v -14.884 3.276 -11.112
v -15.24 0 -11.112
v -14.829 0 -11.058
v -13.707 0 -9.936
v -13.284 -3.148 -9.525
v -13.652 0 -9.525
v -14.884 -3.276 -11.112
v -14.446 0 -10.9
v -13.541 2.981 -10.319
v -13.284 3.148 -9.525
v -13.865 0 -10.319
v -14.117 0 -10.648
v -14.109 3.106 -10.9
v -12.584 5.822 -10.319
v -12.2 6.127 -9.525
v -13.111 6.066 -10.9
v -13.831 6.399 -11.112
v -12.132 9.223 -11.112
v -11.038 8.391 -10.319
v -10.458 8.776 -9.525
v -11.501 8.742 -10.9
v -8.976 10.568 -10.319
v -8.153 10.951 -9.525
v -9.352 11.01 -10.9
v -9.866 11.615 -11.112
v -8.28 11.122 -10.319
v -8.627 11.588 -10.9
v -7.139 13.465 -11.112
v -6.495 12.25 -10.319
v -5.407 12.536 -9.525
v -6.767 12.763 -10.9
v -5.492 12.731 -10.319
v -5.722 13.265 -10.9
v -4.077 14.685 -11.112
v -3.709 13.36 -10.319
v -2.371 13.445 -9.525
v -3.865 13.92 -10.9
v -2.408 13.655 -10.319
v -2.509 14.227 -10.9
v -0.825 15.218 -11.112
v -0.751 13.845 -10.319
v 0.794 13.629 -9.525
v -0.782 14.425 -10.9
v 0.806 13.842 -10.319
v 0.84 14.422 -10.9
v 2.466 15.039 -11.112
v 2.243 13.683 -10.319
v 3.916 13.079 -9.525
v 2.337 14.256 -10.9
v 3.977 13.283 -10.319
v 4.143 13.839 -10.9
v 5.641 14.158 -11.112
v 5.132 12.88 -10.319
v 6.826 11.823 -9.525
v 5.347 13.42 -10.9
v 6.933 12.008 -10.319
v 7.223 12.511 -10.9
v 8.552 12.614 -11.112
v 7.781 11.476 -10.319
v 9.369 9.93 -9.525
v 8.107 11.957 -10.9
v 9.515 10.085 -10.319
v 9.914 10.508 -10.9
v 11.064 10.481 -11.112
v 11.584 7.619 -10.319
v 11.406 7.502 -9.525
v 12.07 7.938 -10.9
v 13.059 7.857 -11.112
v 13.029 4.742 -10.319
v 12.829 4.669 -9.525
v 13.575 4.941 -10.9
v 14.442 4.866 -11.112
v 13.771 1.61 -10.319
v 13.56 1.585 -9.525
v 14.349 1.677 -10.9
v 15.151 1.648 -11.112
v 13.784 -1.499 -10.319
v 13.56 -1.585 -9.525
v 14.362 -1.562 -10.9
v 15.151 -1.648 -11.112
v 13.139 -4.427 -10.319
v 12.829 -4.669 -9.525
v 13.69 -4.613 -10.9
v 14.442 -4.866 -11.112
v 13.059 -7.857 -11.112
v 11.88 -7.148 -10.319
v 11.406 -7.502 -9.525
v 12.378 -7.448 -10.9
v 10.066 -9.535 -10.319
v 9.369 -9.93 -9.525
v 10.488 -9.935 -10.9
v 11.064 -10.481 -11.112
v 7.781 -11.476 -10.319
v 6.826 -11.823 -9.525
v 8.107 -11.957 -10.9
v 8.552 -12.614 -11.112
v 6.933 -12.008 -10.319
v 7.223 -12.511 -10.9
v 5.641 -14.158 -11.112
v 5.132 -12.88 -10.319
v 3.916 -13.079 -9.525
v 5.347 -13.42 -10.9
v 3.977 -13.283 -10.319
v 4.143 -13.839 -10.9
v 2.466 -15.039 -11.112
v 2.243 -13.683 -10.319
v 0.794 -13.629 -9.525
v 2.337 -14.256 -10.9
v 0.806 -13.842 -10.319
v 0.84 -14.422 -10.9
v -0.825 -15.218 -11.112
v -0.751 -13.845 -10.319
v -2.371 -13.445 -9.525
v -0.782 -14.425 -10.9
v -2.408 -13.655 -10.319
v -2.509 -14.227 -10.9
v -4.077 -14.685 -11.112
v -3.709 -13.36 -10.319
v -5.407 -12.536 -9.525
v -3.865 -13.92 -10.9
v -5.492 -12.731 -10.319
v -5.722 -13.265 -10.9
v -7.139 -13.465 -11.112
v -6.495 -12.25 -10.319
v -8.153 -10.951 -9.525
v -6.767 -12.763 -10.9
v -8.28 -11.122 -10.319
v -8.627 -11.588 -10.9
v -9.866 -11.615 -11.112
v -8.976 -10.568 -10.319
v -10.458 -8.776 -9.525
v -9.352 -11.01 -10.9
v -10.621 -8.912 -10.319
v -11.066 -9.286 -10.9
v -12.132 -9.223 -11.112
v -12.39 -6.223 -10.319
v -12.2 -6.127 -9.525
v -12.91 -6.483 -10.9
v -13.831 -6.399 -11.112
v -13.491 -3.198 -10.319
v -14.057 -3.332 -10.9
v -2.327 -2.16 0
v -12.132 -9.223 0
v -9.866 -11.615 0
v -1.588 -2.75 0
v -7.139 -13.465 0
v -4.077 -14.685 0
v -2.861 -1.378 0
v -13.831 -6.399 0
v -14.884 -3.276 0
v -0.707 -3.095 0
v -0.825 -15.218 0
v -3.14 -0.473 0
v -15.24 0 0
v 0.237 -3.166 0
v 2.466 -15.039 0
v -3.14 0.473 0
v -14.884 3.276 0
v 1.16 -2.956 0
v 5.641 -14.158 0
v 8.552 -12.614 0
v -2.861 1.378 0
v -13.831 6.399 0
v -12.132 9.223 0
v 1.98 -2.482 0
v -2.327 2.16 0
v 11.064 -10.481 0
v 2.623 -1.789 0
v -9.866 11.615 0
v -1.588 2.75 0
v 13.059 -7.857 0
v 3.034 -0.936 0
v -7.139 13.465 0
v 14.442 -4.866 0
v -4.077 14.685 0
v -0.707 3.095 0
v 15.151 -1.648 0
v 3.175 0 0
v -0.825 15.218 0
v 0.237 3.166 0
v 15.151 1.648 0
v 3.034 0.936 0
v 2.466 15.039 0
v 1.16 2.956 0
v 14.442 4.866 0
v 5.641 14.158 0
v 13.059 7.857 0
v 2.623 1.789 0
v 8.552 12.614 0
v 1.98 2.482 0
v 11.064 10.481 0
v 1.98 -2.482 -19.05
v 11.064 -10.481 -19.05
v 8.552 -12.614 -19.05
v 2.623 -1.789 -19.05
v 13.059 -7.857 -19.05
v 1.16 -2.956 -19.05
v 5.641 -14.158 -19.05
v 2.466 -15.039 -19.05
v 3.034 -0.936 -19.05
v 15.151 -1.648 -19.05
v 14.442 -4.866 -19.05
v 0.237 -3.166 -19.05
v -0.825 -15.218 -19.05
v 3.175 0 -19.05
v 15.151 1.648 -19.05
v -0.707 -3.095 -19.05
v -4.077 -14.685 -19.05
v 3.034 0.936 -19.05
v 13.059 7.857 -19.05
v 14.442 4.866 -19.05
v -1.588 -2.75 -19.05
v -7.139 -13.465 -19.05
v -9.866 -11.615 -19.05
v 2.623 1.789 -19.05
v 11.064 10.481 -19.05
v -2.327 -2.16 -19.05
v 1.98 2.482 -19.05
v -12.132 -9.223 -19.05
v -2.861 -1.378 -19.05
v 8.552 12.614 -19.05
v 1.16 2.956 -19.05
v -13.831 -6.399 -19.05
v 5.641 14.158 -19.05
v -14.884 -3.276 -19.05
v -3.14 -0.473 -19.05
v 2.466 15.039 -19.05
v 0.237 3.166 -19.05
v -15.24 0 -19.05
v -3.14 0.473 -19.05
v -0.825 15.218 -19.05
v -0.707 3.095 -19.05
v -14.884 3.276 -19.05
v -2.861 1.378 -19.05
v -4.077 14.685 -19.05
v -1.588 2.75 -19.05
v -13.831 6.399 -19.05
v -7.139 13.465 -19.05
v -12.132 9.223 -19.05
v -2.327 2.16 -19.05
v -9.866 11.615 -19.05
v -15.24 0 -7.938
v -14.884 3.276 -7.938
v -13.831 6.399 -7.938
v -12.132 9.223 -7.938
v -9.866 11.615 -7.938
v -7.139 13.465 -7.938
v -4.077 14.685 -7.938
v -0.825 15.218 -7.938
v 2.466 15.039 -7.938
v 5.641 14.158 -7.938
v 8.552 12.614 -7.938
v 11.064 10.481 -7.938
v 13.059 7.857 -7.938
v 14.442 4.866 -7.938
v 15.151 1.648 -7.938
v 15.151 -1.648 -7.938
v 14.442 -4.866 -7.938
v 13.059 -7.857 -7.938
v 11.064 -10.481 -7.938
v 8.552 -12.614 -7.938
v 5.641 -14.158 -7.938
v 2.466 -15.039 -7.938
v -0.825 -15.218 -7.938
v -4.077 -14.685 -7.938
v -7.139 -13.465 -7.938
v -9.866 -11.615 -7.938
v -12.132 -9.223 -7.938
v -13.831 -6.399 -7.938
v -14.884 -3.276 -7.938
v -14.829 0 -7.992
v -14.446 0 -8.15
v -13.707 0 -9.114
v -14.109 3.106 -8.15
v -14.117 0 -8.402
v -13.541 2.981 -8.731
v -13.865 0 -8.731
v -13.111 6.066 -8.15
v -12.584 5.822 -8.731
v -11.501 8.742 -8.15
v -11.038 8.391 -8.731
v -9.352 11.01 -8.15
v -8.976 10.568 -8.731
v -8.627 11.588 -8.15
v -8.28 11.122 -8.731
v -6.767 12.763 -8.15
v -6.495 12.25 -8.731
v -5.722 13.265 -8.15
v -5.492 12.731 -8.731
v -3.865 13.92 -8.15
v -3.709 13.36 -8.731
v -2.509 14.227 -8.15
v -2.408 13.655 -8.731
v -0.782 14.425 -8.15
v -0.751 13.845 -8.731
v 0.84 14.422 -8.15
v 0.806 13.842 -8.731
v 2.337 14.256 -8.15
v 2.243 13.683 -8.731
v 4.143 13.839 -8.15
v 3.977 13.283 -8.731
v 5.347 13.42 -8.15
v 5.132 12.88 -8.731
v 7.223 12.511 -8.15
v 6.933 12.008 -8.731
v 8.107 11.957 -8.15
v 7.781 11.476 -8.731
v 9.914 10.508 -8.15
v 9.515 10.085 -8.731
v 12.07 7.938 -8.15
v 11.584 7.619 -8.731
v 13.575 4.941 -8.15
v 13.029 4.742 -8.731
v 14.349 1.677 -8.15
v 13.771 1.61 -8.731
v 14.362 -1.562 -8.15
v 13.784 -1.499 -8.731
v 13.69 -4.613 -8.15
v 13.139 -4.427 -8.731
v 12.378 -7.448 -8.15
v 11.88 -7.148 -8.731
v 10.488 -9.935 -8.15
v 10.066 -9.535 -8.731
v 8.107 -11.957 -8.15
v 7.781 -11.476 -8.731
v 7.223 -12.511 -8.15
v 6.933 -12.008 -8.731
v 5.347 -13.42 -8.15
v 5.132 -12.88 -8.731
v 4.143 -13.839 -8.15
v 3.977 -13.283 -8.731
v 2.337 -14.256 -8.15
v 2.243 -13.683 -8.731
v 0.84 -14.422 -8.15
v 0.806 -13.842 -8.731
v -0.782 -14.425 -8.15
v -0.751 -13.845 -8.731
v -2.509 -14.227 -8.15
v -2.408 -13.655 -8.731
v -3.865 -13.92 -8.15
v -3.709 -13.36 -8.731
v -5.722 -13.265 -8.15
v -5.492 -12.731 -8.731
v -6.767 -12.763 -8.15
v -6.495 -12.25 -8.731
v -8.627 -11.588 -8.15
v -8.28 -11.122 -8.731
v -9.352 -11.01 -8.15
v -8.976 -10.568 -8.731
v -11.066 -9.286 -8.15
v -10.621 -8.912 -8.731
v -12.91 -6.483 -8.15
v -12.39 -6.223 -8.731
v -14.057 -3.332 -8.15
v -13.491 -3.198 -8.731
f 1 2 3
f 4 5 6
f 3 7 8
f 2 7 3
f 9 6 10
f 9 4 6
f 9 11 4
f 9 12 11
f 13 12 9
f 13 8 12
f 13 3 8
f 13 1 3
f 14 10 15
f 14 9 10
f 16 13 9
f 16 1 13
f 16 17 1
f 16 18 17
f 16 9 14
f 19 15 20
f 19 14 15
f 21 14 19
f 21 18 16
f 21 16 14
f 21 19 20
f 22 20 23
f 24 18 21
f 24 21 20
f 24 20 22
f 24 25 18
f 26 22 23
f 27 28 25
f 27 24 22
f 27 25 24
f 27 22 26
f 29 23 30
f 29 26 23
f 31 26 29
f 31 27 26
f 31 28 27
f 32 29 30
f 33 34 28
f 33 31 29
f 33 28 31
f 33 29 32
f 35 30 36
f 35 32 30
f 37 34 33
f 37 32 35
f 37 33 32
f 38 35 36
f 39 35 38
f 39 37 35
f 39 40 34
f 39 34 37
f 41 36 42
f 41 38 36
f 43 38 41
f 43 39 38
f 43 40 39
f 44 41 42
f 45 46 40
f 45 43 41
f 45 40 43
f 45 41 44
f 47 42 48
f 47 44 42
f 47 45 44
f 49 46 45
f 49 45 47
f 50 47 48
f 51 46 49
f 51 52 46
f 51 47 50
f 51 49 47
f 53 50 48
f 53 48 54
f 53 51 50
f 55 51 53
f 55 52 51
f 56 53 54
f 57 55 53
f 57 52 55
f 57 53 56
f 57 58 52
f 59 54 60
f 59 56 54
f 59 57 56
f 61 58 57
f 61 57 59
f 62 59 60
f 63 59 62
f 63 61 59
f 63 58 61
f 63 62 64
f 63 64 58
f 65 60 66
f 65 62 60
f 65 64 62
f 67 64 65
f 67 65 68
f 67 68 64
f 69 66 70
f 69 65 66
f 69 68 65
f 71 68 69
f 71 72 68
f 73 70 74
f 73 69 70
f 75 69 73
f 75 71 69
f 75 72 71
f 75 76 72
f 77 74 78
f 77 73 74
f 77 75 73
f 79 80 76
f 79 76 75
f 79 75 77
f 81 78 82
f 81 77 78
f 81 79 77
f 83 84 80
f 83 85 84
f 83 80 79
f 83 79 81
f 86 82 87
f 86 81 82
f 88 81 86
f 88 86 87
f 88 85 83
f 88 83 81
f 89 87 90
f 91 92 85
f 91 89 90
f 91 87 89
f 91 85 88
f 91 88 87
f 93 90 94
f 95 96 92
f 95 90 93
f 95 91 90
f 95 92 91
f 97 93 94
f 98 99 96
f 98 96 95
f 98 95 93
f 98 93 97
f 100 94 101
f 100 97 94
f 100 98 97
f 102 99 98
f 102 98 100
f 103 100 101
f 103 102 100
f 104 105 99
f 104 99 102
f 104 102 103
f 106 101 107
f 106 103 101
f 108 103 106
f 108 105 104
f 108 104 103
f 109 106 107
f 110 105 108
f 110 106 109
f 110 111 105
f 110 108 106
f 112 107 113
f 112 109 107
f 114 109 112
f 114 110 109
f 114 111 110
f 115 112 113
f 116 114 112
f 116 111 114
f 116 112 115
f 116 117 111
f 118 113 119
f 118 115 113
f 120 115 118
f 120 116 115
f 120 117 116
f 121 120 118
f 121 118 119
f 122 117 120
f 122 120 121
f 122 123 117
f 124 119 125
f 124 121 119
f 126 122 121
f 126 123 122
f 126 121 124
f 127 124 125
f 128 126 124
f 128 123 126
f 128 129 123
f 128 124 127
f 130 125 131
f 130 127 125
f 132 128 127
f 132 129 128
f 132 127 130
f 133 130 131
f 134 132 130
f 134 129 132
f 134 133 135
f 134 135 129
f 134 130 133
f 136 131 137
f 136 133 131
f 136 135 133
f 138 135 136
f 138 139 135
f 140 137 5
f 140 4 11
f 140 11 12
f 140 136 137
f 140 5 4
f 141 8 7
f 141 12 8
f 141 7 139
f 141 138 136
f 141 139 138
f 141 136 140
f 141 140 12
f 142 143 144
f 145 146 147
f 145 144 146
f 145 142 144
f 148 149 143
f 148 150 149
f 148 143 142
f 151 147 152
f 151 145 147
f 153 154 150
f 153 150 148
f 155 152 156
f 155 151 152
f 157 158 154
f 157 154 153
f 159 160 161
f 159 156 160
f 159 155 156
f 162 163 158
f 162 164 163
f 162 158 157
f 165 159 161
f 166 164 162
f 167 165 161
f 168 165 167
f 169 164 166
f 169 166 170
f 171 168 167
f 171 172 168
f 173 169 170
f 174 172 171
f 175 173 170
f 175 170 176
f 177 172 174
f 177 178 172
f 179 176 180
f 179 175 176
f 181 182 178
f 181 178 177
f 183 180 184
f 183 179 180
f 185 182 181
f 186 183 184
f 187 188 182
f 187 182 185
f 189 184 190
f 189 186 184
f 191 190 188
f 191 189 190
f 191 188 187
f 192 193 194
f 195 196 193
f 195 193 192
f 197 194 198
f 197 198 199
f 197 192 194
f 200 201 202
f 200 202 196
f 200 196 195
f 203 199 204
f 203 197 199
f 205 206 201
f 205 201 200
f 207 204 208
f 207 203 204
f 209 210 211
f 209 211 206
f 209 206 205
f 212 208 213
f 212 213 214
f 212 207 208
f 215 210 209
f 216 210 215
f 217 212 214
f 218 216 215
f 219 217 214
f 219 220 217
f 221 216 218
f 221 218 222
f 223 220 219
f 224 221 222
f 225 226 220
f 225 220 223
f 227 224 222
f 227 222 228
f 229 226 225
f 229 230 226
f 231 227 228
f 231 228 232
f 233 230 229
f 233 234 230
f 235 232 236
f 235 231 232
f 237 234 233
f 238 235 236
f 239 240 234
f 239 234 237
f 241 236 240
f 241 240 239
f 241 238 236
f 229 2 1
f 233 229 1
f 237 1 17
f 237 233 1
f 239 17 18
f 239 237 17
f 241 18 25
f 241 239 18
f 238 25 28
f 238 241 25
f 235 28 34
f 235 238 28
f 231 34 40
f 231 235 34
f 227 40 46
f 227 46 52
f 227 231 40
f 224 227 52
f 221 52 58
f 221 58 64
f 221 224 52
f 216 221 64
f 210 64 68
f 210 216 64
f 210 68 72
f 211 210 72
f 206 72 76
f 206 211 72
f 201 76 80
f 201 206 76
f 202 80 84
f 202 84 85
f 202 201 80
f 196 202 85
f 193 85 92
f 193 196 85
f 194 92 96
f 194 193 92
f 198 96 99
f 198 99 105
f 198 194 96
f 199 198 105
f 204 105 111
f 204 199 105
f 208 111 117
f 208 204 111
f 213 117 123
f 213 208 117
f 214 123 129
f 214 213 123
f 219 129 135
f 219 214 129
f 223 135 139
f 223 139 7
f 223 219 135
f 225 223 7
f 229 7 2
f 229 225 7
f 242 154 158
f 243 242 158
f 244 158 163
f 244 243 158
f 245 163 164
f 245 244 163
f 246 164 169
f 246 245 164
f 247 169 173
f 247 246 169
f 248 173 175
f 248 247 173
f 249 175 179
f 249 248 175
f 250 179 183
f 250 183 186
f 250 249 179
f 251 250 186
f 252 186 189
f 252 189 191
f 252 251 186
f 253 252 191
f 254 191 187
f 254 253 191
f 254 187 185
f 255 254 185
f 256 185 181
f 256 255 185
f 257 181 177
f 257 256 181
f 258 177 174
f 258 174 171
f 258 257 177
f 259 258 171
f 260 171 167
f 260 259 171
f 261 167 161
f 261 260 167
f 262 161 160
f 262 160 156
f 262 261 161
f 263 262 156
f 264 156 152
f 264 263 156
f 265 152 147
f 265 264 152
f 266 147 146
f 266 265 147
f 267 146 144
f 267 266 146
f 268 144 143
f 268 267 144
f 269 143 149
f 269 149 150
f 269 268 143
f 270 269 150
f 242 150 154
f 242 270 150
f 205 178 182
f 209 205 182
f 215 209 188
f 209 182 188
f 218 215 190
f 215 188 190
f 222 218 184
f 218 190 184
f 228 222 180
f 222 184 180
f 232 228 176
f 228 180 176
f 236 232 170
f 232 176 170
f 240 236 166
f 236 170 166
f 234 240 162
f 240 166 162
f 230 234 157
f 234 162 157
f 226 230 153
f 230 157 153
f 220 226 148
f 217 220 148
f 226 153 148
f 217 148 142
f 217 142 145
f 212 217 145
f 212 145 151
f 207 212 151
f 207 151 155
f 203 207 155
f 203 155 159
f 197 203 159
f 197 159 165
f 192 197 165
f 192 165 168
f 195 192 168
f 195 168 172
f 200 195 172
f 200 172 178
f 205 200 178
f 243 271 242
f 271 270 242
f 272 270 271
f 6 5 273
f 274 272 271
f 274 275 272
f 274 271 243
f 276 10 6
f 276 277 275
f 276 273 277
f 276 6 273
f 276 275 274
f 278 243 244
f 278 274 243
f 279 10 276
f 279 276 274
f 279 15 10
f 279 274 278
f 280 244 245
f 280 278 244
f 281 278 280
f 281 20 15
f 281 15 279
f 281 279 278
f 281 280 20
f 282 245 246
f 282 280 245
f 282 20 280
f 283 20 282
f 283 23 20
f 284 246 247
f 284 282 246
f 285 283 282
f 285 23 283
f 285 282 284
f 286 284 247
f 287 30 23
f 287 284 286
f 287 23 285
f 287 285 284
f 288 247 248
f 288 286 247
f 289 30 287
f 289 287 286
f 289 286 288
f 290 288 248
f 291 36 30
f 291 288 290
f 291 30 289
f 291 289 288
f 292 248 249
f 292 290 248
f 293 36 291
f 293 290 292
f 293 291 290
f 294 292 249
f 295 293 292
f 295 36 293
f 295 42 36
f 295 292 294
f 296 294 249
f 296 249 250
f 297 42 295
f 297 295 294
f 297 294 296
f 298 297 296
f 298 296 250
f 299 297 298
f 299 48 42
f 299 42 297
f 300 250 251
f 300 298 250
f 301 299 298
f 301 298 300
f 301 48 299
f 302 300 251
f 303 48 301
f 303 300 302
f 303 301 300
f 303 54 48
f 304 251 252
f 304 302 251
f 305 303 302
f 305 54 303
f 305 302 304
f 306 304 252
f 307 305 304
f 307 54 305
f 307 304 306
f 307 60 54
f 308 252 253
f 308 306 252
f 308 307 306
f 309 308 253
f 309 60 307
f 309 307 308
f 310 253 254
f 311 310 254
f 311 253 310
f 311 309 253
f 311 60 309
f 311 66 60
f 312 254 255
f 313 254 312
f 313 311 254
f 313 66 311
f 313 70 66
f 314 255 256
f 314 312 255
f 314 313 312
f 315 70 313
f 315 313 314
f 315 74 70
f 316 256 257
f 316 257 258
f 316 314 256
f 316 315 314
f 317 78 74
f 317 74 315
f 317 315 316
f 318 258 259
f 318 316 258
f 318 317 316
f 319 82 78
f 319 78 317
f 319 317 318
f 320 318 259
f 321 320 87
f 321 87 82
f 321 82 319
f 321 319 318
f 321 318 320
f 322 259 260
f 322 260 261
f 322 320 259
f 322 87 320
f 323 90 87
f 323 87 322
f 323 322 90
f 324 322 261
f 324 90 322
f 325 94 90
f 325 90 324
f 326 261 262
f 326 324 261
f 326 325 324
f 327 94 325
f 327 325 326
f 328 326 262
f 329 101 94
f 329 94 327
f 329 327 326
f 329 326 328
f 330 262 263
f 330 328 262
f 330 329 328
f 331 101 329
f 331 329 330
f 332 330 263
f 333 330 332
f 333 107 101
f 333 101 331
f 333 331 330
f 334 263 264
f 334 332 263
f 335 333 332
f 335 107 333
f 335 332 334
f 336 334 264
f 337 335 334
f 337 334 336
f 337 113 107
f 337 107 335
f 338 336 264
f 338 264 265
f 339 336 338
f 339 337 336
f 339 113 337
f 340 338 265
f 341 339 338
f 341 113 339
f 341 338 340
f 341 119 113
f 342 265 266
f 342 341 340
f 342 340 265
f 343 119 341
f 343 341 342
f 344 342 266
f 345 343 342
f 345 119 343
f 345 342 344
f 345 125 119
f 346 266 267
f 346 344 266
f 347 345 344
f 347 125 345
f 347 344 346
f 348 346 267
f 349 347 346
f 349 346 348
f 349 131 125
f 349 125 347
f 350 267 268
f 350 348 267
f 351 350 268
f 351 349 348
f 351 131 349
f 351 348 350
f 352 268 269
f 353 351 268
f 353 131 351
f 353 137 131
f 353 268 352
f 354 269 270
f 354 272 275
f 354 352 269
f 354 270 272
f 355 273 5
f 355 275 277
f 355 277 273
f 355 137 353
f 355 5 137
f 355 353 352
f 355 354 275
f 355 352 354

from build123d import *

# Parameters (mm, degrees)
F2_R     = 3.175
F3_DEPTH = 25.4
F4_R     = 3.175
F5_DEPTH = 25.4


with BuildPart() as f1:
    # F0 (on Front) → F1 (revolve)
    with BuildSketch(Plane.XZ):
        with BuildLine():
            Line((0, -19.05), (0, 0))
            Line((0, 0), (-15.24, 0))
            Line((-15.24, 0), (-15.24, -7.9375))
            ThreePointArc((-15.24, -7.9375), (-14.117468, -8.402468), (-13.6525, -9.525))
            ThreePointArc((-13.6525, -9.525), (-14.117468, -10.647532), (-15.24, -11.1125))
            Line((-15.24, -11.1125), (-15.24, -19.05))
            Line((-15.24, -19.05), (0, -19.05))
        make_face()
    revolve(axis=Axis((0, 0, -9.525), (0, 0, -1)))

    # F2 (on face) → F3 (cut)
    with BuildSketch(Plane.XY):
        Circle(F2_R)
    extrude(amount=-F3_DEPTH, mode=Mode.SUBTRACT)

    # F4 (on face) → F5 (cut)
    with BuildSketch(Plane.XY):
        Circle(F4_R)
    extrude(amount=-F5_DEPTH, mode=Mode.SUBTRACT)


solid = f1.part
